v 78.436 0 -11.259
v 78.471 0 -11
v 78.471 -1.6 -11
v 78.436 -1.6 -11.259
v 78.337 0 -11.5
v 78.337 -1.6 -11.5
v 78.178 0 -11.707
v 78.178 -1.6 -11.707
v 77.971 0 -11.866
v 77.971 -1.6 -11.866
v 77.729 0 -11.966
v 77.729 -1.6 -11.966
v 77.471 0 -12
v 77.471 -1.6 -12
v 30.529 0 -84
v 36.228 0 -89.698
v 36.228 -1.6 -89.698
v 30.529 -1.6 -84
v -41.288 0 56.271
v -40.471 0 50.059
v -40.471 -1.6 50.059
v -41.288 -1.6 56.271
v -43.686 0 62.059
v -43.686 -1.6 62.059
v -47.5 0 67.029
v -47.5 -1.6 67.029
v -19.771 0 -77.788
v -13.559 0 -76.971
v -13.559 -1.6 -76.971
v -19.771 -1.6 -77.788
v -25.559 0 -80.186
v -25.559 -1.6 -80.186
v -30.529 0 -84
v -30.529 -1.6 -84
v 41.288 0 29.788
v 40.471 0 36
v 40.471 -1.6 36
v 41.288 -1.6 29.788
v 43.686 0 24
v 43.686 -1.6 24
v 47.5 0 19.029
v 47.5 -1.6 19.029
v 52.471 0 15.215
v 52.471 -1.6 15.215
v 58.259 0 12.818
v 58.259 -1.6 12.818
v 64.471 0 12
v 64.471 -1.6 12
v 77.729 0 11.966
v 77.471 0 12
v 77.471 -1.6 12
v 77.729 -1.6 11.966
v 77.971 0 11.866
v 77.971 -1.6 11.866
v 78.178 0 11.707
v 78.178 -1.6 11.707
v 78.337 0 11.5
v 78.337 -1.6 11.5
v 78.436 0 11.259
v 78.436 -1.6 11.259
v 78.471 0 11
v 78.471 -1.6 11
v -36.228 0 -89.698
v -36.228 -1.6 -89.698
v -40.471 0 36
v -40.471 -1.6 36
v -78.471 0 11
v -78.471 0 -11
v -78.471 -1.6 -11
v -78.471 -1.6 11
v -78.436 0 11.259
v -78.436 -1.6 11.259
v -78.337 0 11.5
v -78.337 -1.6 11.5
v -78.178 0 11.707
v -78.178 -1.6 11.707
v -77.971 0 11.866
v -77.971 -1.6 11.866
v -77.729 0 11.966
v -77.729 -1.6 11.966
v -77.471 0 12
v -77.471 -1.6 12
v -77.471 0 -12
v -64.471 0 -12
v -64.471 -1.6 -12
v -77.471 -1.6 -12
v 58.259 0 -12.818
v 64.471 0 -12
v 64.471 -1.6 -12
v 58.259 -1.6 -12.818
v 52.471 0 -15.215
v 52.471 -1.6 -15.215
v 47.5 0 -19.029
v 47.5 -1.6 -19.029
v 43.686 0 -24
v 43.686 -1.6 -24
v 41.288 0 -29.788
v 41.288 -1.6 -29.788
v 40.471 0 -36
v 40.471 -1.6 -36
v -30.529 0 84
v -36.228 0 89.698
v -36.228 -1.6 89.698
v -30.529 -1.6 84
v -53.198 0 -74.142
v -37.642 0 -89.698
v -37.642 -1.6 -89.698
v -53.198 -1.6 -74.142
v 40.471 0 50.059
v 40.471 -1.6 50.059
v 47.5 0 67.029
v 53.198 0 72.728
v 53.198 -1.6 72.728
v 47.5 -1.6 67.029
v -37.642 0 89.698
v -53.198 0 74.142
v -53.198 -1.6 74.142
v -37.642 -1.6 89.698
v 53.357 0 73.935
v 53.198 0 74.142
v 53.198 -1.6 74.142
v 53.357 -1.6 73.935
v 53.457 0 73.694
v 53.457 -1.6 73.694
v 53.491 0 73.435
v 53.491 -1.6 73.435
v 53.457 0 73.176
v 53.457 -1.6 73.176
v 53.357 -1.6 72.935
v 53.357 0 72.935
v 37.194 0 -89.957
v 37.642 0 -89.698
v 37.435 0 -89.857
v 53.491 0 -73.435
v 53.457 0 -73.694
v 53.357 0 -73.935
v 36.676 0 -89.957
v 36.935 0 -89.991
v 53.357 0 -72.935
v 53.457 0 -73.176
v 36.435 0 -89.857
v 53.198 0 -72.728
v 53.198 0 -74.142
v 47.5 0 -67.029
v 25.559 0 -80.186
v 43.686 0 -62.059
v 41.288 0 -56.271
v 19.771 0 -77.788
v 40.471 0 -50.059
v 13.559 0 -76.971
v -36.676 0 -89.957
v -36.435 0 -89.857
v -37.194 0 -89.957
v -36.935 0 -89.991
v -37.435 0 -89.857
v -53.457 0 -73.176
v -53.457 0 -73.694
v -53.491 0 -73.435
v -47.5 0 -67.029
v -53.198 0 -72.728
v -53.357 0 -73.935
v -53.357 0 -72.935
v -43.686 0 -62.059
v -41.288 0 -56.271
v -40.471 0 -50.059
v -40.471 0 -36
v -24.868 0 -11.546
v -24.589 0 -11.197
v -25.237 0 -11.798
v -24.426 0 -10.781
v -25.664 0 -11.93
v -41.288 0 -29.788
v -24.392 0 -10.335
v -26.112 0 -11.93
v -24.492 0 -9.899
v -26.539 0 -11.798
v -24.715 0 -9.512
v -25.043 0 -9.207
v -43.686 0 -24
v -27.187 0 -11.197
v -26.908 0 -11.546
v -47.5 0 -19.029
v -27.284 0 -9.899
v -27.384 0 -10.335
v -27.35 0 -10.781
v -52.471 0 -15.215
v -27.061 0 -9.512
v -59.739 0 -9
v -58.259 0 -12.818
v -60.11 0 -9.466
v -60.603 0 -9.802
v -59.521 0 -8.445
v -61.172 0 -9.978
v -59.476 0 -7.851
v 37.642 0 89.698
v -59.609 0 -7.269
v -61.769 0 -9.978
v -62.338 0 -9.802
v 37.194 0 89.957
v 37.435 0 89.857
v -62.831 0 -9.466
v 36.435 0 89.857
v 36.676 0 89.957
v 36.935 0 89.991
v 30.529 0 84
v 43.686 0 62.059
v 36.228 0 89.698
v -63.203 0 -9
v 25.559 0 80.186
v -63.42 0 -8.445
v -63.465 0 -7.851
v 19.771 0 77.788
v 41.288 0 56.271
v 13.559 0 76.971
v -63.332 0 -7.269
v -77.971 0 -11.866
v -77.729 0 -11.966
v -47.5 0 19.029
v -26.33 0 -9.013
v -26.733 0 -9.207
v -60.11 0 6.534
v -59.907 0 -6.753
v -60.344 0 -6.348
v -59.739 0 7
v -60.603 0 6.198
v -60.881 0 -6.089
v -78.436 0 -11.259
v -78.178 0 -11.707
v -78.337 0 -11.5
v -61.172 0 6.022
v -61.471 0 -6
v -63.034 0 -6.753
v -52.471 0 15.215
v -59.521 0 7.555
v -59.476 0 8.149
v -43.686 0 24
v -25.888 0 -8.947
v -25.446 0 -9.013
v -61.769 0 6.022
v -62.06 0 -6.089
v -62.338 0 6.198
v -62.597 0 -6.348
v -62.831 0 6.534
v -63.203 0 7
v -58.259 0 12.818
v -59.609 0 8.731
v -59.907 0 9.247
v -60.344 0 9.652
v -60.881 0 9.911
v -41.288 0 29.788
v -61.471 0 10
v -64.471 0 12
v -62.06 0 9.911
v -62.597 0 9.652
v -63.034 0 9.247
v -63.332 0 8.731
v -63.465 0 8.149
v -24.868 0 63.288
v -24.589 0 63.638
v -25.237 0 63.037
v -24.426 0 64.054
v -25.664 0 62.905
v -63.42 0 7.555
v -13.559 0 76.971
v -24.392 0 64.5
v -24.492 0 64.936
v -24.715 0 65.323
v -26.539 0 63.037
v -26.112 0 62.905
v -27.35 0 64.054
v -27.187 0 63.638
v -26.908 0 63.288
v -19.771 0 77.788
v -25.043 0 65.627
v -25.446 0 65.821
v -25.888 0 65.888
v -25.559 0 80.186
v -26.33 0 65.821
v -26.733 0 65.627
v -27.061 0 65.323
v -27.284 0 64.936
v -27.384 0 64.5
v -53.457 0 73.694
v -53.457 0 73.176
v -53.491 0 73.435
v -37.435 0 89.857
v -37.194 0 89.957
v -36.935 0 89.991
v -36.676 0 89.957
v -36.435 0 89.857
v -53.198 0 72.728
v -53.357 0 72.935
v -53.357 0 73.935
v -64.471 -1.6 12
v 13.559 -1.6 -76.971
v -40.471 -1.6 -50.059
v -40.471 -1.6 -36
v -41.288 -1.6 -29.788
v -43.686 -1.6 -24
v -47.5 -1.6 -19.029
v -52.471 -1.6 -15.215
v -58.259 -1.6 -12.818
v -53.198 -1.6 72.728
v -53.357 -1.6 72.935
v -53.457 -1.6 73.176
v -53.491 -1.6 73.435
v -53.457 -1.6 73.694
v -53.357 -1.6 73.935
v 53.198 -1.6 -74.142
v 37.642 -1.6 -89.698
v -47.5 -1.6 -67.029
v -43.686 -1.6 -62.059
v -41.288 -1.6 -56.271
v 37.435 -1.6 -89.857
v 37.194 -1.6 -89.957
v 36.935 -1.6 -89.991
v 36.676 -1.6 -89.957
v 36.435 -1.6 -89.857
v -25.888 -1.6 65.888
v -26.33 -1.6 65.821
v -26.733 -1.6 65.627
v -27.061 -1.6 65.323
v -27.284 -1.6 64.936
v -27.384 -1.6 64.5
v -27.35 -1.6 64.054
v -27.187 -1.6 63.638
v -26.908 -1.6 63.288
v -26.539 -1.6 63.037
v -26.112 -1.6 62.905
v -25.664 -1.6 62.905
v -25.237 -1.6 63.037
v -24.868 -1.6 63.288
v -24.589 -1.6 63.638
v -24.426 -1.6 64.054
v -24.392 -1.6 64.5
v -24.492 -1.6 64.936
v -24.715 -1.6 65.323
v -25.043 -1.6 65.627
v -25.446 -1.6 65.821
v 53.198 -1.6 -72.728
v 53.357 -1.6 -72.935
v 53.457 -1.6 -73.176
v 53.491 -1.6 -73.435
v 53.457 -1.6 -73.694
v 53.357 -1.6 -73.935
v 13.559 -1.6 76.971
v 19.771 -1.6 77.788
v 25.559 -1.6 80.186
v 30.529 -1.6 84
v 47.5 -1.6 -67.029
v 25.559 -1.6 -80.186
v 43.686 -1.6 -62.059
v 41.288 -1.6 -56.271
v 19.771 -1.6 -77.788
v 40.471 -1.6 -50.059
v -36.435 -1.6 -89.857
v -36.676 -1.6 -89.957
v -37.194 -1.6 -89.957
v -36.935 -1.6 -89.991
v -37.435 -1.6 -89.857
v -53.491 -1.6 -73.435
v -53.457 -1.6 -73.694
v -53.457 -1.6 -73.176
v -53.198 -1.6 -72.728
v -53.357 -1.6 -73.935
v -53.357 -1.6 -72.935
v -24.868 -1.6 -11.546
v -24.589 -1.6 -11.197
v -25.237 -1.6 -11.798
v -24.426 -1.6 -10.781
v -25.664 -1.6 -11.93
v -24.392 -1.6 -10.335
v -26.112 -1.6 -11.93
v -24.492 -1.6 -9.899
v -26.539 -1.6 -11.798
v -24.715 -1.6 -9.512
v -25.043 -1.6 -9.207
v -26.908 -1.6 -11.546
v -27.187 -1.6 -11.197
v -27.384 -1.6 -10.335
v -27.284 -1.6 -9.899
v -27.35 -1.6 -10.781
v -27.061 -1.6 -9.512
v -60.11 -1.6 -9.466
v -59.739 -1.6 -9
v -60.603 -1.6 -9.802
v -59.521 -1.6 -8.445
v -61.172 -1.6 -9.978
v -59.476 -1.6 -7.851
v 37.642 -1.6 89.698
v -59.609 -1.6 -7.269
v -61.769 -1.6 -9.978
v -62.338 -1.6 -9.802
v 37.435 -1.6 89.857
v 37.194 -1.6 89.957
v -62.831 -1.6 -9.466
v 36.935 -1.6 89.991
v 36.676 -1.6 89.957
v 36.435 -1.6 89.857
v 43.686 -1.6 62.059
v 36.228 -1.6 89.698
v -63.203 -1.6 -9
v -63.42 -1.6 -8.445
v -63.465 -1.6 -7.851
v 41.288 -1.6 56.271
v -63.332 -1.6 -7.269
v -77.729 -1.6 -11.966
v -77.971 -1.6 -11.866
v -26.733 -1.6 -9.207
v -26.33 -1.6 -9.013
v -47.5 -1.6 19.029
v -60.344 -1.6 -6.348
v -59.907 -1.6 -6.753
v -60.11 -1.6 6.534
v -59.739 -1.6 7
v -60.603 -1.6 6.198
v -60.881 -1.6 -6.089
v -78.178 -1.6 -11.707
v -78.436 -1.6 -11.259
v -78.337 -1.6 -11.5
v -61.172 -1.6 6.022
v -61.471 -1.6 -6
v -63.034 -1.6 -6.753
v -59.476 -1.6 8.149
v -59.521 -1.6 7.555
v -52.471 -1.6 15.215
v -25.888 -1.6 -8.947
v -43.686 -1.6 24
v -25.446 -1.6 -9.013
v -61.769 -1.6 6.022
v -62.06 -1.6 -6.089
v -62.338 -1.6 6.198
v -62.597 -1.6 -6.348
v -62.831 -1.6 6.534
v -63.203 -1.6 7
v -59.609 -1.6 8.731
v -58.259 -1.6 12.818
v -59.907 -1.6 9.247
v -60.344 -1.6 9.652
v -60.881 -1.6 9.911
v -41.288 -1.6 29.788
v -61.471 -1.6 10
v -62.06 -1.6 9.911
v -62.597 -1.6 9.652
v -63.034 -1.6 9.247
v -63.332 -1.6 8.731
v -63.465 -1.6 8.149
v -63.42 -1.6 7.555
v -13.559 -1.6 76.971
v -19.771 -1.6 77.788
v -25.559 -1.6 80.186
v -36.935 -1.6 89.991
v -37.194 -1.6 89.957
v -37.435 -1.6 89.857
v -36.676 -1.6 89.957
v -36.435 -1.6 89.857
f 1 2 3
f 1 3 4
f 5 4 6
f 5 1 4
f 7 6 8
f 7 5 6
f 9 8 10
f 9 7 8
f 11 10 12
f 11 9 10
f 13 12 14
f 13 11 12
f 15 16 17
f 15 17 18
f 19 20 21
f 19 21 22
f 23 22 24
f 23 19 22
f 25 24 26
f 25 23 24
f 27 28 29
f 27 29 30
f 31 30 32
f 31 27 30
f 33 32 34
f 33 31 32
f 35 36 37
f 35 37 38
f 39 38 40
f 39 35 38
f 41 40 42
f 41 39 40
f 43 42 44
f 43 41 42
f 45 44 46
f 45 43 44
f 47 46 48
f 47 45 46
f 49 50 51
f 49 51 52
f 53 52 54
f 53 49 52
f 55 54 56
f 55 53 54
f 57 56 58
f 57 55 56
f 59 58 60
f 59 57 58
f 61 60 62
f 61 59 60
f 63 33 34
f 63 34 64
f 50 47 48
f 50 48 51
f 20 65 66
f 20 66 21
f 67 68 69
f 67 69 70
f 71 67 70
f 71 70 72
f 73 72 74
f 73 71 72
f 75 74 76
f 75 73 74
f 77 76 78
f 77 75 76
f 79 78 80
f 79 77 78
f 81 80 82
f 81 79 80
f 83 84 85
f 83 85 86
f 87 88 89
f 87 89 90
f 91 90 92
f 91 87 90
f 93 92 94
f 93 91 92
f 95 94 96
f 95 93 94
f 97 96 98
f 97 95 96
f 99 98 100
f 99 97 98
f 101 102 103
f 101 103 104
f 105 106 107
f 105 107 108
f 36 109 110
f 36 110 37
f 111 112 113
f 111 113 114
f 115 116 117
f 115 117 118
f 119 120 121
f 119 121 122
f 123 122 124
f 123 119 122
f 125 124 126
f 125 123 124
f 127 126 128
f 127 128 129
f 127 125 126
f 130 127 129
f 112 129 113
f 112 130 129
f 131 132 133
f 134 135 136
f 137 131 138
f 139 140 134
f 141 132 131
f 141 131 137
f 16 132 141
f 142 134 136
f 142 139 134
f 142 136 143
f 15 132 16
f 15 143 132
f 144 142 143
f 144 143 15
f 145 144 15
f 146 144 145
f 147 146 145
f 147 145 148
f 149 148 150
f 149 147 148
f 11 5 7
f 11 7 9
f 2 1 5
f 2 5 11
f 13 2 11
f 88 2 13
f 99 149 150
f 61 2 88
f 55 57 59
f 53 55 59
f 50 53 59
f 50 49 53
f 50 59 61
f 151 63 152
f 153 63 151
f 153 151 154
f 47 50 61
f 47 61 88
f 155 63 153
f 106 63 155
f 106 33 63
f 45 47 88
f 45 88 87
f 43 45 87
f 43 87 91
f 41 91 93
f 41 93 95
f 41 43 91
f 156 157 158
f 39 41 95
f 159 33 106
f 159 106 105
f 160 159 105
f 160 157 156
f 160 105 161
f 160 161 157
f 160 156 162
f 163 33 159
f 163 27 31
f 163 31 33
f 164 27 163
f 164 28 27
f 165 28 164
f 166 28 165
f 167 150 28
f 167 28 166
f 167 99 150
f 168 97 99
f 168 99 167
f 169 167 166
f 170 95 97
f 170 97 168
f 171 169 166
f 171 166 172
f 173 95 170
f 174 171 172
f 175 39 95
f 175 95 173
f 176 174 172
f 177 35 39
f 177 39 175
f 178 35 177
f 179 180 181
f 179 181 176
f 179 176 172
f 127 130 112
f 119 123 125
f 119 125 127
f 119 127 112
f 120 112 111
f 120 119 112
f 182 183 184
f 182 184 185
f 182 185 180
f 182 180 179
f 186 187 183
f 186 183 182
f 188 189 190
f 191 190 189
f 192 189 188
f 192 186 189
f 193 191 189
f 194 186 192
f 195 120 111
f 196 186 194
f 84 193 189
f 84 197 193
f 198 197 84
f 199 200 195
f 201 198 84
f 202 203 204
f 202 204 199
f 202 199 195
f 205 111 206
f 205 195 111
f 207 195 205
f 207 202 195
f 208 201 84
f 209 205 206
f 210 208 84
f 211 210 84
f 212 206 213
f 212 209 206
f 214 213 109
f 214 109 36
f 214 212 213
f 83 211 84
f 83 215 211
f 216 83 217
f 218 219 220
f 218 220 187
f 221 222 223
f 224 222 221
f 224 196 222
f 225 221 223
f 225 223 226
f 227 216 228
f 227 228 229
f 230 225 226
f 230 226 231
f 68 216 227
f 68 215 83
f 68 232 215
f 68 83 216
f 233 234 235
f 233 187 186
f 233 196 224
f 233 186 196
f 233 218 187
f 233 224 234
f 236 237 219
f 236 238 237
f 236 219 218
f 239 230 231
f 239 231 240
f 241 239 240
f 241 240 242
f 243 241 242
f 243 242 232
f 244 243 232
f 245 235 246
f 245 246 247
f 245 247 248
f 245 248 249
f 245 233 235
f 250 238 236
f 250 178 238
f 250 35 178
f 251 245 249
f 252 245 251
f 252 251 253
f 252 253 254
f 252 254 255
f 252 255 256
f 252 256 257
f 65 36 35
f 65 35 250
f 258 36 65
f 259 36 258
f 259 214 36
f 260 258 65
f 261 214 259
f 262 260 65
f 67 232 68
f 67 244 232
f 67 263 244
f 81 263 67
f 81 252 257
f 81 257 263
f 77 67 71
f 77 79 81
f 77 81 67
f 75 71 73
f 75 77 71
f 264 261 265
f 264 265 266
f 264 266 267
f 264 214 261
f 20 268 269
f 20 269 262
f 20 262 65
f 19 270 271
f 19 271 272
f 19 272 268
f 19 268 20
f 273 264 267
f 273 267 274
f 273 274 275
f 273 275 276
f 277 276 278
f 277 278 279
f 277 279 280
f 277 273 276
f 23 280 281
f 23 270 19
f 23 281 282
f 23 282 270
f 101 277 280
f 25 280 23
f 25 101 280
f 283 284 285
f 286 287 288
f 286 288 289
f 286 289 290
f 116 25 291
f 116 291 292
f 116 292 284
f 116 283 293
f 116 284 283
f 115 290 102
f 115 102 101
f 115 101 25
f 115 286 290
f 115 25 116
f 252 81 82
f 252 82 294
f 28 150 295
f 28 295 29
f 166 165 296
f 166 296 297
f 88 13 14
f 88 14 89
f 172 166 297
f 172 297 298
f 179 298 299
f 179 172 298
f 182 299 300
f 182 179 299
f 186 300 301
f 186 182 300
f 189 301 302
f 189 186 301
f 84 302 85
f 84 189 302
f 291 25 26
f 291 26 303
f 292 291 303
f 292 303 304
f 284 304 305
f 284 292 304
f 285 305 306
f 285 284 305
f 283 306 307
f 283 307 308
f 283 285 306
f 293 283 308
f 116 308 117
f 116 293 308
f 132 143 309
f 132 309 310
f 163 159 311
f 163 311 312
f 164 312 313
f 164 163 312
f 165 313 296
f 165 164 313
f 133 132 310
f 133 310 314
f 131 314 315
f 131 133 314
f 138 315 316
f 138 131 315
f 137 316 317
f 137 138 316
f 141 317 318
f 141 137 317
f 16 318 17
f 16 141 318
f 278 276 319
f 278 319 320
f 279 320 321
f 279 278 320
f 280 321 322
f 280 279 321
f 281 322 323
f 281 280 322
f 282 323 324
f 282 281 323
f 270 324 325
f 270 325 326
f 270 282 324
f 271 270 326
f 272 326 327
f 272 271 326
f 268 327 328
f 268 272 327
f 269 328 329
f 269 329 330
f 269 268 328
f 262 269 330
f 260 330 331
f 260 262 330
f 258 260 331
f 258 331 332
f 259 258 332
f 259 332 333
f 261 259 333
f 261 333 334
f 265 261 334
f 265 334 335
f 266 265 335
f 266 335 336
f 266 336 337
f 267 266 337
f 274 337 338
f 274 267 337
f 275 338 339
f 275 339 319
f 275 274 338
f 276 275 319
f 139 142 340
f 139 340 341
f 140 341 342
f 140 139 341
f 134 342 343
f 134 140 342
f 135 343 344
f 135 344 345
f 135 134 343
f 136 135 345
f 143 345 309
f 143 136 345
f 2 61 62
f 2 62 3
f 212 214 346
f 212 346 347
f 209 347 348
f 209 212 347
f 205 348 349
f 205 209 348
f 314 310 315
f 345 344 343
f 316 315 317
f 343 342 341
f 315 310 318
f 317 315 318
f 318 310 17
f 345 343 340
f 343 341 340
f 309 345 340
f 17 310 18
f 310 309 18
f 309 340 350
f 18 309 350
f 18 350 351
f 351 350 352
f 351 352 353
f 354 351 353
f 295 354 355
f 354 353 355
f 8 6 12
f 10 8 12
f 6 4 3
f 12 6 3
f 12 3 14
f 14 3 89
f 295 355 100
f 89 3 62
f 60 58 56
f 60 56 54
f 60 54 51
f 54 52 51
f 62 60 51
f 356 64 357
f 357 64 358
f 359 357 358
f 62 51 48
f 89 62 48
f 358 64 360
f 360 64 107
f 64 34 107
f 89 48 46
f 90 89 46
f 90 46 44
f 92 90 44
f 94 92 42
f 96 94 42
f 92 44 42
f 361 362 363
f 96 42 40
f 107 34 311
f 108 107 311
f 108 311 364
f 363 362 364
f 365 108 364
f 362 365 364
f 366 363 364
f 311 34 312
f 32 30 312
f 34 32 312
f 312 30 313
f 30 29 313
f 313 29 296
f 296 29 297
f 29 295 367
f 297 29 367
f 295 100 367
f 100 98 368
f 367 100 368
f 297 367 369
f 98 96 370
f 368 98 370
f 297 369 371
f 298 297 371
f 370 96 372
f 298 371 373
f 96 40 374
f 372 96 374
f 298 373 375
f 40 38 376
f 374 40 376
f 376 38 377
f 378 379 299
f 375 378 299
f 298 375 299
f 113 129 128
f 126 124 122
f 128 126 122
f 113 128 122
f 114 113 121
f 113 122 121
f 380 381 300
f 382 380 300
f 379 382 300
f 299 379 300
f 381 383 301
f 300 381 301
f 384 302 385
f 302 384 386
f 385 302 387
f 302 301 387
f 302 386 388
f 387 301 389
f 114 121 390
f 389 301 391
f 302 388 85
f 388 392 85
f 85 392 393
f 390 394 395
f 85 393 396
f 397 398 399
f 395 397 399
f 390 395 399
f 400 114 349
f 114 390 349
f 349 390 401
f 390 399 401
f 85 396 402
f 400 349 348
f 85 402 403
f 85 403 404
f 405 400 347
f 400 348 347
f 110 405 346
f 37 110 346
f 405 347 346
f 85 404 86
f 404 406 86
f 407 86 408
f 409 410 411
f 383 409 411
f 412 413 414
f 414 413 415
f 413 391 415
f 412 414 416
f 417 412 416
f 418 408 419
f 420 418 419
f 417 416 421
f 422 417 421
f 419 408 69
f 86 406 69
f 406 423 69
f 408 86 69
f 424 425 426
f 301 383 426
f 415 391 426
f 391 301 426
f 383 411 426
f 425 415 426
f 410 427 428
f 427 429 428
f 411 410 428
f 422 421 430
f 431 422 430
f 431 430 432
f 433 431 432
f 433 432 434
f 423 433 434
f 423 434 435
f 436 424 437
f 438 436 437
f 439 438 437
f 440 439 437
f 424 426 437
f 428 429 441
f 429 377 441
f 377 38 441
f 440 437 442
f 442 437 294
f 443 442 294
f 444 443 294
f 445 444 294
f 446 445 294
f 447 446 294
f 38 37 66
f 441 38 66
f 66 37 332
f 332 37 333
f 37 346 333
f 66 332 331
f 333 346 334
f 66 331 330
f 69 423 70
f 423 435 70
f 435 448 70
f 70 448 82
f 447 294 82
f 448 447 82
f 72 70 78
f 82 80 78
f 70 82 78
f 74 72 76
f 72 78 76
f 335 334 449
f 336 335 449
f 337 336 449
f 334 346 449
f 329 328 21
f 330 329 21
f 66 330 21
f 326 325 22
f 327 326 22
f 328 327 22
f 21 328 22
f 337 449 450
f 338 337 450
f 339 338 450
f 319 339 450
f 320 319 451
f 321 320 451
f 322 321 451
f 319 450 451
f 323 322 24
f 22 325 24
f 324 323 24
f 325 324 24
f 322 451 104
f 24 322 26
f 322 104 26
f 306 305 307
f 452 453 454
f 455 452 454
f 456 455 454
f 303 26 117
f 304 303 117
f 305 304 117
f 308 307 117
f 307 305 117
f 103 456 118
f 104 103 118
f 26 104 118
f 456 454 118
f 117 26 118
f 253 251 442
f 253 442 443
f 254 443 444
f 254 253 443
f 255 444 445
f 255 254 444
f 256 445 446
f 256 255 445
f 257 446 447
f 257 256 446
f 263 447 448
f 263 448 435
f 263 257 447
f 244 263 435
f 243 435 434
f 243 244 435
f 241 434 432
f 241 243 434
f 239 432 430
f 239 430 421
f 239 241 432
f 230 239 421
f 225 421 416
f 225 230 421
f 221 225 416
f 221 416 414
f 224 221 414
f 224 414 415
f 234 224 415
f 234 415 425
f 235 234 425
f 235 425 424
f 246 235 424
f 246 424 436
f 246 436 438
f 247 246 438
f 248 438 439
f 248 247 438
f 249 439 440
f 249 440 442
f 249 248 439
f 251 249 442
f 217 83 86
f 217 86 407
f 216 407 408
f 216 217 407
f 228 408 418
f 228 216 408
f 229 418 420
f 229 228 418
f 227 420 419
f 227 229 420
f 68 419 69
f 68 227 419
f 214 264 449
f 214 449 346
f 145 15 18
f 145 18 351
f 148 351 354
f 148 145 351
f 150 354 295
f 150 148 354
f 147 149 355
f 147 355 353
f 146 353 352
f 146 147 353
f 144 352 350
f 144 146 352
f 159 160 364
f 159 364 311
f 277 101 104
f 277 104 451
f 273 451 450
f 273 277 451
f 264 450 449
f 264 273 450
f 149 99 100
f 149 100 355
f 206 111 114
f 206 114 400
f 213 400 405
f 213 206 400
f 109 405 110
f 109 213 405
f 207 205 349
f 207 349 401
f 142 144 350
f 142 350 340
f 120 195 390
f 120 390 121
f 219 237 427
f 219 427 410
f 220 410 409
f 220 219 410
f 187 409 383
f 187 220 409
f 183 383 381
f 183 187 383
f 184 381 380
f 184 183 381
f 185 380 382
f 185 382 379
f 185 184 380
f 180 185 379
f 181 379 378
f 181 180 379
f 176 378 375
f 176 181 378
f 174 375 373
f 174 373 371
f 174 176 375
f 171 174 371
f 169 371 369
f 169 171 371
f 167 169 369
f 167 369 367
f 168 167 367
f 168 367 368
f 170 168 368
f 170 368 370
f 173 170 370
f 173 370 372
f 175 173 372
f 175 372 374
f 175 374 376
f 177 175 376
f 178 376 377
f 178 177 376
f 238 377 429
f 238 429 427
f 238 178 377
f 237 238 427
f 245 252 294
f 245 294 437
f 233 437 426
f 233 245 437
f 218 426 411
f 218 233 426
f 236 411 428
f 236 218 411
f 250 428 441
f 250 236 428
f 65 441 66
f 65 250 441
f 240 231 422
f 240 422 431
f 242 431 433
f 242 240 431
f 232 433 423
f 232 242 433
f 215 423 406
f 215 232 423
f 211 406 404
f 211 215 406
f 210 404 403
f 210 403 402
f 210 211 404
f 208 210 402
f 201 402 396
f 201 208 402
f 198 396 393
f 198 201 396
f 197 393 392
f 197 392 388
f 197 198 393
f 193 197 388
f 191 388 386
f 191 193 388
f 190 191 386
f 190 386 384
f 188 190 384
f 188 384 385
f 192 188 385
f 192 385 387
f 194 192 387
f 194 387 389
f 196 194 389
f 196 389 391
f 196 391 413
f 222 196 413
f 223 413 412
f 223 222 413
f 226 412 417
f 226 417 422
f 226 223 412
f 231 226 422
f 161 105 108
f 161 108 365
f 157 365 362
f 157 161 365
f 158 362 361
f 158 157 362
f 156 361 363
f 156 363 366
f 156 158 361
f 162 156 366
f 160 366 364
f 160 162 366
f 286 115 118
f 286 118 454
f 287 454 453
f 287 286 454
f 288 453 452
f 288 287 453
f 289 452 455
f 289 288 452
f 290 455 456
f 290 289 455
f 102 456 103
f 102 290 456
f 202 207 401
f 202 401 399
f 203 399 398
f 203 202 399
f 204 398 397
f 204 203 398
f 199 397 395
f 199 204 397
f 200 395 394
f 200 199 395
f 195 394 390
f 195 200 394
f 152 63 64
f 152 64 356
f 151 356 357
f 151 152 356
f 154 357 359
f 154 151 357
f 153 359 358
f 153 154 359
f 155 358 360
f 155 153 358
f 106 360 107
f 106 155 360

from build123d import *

# Parameters (mm, degrees)
SKETCH_8_R      = 2
SKETCH_8_R_2    = 1.5
EXTRUDE_1_DEPTH = 1.6


with BuildPart() as part:
    # 草图8 → 凸台-拉伸1 (new body)
    with BuildSketch(Plane.XZ):
        with BuildLine():
            Line((30.529437252, 84), (36.227922061, 89.69848481))
            ThreePointArc((36.227922061, 89.69848481), (36.935028843, 89.991378029), (37.642135624, 89.69848481))
            Line((37.642135624, 89.69848481), (53.19848481, 74.142135624))
            ThreePointArc((53.19848481, 74.142135624), (53.491378029, 73.435028843), (53.19848481, 72.727922061))
            Line((53.19848481, 72.727922061), (47.5, 67.029437252))
            ThreePointArc((47.5, 67.029437252), (42.297453968, 59.24327688), (40.470562748, 50.058874503))
            Line((40.470562748, 50.058874503), (40.470562748, 36))
            ThreePointArc((40.470562748, 36), (47.5, 19.029437252), (64.470562748, 12))
            Line((64.470562748, 12), (77.470562748, 12))
            ThreePointArc((77.470562748, 12), (78.17766953, 11.707106781), (78.470562748, 11))
            Line((78.470562748, 11), (78.470562748, -11))
            ThreePointArc((78.470562748, -11), (78.17766953, -11.707106781), (77.470562748, -12))
            Line((77.470562748, -12), (64.470562748, -12))
            ThreePointArc((64.470562748, -12), (47.5, -19.029437252), (40.470562748, -36))
            Line((40.470562748, -36), (40.470562748, -50.058874503))
            ThreePointArc((40.470562748, -50.058874503), (42.297453968, -59.24327688), (47.5, -67.029437252))
            Line((47.5, -67.029437252), (53.19848481, -72.727922061))
            ThreePointArc((53.19848481, -72.727922061), (53.491378029, -73.435028843), (53.19848481, -74.142135624))
            Line((53.19848481, -74.142135624), (37.642135624, -89.69848481))
            ThreePointArc((37.642135624, -89.69848481), (36.935028843, -89.991378029), (36.227922061, -89.69848481))
            Line((36.227922061, -89.69848481), (30.529437252, -84))
            ThreePointArc((30.529437252, -84), (22.74327688, -78.797453968), (13.558874503, -76.970562748))
            Line((13.558874503, -76.970562748), (-13.558874503, -76.970562748))
            ThreePointArc((-13.558874503, -76.970562748), (-22.74327688, -78.797453968), (-30.529437252, -84))
            Line((-30.529437252, -84), (-36.227922061, -89.69848481))
            ThreePointArc((-36.227922061, -89.69848481), (-36.935028843, -89.991378029), (-37.642135624, -89.69848481))
            Line((-37.642135624, -89.69848481), (-53.19848481, -74.142135624))
            ThreePointArc((-53.19848481, -74.142135624), (-53.491378029, -73.435028843), (-53.19848481, -72.727922061))
            Line((-53.19848481, -72.727922061), (-47.5, -67.029437252))
            ThreePointArc((-47.5, -67.029437252), (-42.297453968, -59.24327688), (-40.470562748, -50.058874503))
            Line((-40.470562748, -50.058874503), (-40.470562748, -36))
            ThreePointArc((-40.470562748, -36), (-47.5, -19.029437252), (-64.470562748, -12))
            Line((-64.470562748, -12), (-77.470562748, -12))
            ThreePointArc((-77.470562748, -12), (-78.17766953, -11.707106781), (-78.470562748, -11))
            Line((-78.470562748, -11), (-78.470562748, 11))
            ThreePointArc((-78.470562748, 11), (-78.17766953, 11.707106781), (-77.470562748, 12))
            Line((-77.470562748, 12), (-64.470562748, 12))
            ThreePointArc((-64.470562748, 12), (-47.5, 19.029437252), (-40.470562748, 36))
            Line((-40.470562748, 36), (-40.470562748, 50.058874503))
            ThreePointArc((-40.470562748, 50.058874503), (-42.297453968, 59.24327688), (-47.5, 67.029437252))
            Line((-47.5, 67.029437252), (-53.19848481, 72.727922061))
            ThreePointArc((-53.19848481, 72.727922061), (-53.491378029, 73.435028843), (-53.19848481, 74.142135624))
            Line((-53.19848481, 74.142135624), (-37.642135624, 89.69848481))
            ThreePointArc((-37.642135624, 89.69848481), (-36.935028843, 89.991378029), (-36.227922061, 89.69848481))
            Line((-36.227922061, 89.69848481), (-30.529437252, 84))
            ThreePointArc((-30.529437252, 84), (-22.74327688, 78.797453968), (-13.558874503, 76.970562748))
            Line((-13.558874503, 76.970562748), (13.558874503, 76.970562748))
            ThreePointArc((13.558874503, 76.970562748), (22.74327688, 78.797453968), (30.529437252, 84))
        make_face()
        with Locations(Location((-61.470562748, 8, 0), (0, 0, 90))):
            Circle(SKETCH_8_R, mode=Mode.SUBTRACT)
        with Locations(Location((-25.887975085, -10.446849588, 0), (0, 0, 90))):
            Circle(SKETCH_8_R_2, mode=Mode.SUBTRACT)
        with Locations(Location((-25.887975085, 64.387975085, 0), (0, 0, 90))):
            Circle(SKETCH_8_R_2, mode=Mode.SUBTRACT)
        with Locations(Location((-61.470562748, -8, 0), (0, 0, 90))):
            Circle(SKETCH_8_R, mode=Mode.SUBTRACT)
    extrude(amount=EXTRUDE_1_DEPTH)


solid = part.part
